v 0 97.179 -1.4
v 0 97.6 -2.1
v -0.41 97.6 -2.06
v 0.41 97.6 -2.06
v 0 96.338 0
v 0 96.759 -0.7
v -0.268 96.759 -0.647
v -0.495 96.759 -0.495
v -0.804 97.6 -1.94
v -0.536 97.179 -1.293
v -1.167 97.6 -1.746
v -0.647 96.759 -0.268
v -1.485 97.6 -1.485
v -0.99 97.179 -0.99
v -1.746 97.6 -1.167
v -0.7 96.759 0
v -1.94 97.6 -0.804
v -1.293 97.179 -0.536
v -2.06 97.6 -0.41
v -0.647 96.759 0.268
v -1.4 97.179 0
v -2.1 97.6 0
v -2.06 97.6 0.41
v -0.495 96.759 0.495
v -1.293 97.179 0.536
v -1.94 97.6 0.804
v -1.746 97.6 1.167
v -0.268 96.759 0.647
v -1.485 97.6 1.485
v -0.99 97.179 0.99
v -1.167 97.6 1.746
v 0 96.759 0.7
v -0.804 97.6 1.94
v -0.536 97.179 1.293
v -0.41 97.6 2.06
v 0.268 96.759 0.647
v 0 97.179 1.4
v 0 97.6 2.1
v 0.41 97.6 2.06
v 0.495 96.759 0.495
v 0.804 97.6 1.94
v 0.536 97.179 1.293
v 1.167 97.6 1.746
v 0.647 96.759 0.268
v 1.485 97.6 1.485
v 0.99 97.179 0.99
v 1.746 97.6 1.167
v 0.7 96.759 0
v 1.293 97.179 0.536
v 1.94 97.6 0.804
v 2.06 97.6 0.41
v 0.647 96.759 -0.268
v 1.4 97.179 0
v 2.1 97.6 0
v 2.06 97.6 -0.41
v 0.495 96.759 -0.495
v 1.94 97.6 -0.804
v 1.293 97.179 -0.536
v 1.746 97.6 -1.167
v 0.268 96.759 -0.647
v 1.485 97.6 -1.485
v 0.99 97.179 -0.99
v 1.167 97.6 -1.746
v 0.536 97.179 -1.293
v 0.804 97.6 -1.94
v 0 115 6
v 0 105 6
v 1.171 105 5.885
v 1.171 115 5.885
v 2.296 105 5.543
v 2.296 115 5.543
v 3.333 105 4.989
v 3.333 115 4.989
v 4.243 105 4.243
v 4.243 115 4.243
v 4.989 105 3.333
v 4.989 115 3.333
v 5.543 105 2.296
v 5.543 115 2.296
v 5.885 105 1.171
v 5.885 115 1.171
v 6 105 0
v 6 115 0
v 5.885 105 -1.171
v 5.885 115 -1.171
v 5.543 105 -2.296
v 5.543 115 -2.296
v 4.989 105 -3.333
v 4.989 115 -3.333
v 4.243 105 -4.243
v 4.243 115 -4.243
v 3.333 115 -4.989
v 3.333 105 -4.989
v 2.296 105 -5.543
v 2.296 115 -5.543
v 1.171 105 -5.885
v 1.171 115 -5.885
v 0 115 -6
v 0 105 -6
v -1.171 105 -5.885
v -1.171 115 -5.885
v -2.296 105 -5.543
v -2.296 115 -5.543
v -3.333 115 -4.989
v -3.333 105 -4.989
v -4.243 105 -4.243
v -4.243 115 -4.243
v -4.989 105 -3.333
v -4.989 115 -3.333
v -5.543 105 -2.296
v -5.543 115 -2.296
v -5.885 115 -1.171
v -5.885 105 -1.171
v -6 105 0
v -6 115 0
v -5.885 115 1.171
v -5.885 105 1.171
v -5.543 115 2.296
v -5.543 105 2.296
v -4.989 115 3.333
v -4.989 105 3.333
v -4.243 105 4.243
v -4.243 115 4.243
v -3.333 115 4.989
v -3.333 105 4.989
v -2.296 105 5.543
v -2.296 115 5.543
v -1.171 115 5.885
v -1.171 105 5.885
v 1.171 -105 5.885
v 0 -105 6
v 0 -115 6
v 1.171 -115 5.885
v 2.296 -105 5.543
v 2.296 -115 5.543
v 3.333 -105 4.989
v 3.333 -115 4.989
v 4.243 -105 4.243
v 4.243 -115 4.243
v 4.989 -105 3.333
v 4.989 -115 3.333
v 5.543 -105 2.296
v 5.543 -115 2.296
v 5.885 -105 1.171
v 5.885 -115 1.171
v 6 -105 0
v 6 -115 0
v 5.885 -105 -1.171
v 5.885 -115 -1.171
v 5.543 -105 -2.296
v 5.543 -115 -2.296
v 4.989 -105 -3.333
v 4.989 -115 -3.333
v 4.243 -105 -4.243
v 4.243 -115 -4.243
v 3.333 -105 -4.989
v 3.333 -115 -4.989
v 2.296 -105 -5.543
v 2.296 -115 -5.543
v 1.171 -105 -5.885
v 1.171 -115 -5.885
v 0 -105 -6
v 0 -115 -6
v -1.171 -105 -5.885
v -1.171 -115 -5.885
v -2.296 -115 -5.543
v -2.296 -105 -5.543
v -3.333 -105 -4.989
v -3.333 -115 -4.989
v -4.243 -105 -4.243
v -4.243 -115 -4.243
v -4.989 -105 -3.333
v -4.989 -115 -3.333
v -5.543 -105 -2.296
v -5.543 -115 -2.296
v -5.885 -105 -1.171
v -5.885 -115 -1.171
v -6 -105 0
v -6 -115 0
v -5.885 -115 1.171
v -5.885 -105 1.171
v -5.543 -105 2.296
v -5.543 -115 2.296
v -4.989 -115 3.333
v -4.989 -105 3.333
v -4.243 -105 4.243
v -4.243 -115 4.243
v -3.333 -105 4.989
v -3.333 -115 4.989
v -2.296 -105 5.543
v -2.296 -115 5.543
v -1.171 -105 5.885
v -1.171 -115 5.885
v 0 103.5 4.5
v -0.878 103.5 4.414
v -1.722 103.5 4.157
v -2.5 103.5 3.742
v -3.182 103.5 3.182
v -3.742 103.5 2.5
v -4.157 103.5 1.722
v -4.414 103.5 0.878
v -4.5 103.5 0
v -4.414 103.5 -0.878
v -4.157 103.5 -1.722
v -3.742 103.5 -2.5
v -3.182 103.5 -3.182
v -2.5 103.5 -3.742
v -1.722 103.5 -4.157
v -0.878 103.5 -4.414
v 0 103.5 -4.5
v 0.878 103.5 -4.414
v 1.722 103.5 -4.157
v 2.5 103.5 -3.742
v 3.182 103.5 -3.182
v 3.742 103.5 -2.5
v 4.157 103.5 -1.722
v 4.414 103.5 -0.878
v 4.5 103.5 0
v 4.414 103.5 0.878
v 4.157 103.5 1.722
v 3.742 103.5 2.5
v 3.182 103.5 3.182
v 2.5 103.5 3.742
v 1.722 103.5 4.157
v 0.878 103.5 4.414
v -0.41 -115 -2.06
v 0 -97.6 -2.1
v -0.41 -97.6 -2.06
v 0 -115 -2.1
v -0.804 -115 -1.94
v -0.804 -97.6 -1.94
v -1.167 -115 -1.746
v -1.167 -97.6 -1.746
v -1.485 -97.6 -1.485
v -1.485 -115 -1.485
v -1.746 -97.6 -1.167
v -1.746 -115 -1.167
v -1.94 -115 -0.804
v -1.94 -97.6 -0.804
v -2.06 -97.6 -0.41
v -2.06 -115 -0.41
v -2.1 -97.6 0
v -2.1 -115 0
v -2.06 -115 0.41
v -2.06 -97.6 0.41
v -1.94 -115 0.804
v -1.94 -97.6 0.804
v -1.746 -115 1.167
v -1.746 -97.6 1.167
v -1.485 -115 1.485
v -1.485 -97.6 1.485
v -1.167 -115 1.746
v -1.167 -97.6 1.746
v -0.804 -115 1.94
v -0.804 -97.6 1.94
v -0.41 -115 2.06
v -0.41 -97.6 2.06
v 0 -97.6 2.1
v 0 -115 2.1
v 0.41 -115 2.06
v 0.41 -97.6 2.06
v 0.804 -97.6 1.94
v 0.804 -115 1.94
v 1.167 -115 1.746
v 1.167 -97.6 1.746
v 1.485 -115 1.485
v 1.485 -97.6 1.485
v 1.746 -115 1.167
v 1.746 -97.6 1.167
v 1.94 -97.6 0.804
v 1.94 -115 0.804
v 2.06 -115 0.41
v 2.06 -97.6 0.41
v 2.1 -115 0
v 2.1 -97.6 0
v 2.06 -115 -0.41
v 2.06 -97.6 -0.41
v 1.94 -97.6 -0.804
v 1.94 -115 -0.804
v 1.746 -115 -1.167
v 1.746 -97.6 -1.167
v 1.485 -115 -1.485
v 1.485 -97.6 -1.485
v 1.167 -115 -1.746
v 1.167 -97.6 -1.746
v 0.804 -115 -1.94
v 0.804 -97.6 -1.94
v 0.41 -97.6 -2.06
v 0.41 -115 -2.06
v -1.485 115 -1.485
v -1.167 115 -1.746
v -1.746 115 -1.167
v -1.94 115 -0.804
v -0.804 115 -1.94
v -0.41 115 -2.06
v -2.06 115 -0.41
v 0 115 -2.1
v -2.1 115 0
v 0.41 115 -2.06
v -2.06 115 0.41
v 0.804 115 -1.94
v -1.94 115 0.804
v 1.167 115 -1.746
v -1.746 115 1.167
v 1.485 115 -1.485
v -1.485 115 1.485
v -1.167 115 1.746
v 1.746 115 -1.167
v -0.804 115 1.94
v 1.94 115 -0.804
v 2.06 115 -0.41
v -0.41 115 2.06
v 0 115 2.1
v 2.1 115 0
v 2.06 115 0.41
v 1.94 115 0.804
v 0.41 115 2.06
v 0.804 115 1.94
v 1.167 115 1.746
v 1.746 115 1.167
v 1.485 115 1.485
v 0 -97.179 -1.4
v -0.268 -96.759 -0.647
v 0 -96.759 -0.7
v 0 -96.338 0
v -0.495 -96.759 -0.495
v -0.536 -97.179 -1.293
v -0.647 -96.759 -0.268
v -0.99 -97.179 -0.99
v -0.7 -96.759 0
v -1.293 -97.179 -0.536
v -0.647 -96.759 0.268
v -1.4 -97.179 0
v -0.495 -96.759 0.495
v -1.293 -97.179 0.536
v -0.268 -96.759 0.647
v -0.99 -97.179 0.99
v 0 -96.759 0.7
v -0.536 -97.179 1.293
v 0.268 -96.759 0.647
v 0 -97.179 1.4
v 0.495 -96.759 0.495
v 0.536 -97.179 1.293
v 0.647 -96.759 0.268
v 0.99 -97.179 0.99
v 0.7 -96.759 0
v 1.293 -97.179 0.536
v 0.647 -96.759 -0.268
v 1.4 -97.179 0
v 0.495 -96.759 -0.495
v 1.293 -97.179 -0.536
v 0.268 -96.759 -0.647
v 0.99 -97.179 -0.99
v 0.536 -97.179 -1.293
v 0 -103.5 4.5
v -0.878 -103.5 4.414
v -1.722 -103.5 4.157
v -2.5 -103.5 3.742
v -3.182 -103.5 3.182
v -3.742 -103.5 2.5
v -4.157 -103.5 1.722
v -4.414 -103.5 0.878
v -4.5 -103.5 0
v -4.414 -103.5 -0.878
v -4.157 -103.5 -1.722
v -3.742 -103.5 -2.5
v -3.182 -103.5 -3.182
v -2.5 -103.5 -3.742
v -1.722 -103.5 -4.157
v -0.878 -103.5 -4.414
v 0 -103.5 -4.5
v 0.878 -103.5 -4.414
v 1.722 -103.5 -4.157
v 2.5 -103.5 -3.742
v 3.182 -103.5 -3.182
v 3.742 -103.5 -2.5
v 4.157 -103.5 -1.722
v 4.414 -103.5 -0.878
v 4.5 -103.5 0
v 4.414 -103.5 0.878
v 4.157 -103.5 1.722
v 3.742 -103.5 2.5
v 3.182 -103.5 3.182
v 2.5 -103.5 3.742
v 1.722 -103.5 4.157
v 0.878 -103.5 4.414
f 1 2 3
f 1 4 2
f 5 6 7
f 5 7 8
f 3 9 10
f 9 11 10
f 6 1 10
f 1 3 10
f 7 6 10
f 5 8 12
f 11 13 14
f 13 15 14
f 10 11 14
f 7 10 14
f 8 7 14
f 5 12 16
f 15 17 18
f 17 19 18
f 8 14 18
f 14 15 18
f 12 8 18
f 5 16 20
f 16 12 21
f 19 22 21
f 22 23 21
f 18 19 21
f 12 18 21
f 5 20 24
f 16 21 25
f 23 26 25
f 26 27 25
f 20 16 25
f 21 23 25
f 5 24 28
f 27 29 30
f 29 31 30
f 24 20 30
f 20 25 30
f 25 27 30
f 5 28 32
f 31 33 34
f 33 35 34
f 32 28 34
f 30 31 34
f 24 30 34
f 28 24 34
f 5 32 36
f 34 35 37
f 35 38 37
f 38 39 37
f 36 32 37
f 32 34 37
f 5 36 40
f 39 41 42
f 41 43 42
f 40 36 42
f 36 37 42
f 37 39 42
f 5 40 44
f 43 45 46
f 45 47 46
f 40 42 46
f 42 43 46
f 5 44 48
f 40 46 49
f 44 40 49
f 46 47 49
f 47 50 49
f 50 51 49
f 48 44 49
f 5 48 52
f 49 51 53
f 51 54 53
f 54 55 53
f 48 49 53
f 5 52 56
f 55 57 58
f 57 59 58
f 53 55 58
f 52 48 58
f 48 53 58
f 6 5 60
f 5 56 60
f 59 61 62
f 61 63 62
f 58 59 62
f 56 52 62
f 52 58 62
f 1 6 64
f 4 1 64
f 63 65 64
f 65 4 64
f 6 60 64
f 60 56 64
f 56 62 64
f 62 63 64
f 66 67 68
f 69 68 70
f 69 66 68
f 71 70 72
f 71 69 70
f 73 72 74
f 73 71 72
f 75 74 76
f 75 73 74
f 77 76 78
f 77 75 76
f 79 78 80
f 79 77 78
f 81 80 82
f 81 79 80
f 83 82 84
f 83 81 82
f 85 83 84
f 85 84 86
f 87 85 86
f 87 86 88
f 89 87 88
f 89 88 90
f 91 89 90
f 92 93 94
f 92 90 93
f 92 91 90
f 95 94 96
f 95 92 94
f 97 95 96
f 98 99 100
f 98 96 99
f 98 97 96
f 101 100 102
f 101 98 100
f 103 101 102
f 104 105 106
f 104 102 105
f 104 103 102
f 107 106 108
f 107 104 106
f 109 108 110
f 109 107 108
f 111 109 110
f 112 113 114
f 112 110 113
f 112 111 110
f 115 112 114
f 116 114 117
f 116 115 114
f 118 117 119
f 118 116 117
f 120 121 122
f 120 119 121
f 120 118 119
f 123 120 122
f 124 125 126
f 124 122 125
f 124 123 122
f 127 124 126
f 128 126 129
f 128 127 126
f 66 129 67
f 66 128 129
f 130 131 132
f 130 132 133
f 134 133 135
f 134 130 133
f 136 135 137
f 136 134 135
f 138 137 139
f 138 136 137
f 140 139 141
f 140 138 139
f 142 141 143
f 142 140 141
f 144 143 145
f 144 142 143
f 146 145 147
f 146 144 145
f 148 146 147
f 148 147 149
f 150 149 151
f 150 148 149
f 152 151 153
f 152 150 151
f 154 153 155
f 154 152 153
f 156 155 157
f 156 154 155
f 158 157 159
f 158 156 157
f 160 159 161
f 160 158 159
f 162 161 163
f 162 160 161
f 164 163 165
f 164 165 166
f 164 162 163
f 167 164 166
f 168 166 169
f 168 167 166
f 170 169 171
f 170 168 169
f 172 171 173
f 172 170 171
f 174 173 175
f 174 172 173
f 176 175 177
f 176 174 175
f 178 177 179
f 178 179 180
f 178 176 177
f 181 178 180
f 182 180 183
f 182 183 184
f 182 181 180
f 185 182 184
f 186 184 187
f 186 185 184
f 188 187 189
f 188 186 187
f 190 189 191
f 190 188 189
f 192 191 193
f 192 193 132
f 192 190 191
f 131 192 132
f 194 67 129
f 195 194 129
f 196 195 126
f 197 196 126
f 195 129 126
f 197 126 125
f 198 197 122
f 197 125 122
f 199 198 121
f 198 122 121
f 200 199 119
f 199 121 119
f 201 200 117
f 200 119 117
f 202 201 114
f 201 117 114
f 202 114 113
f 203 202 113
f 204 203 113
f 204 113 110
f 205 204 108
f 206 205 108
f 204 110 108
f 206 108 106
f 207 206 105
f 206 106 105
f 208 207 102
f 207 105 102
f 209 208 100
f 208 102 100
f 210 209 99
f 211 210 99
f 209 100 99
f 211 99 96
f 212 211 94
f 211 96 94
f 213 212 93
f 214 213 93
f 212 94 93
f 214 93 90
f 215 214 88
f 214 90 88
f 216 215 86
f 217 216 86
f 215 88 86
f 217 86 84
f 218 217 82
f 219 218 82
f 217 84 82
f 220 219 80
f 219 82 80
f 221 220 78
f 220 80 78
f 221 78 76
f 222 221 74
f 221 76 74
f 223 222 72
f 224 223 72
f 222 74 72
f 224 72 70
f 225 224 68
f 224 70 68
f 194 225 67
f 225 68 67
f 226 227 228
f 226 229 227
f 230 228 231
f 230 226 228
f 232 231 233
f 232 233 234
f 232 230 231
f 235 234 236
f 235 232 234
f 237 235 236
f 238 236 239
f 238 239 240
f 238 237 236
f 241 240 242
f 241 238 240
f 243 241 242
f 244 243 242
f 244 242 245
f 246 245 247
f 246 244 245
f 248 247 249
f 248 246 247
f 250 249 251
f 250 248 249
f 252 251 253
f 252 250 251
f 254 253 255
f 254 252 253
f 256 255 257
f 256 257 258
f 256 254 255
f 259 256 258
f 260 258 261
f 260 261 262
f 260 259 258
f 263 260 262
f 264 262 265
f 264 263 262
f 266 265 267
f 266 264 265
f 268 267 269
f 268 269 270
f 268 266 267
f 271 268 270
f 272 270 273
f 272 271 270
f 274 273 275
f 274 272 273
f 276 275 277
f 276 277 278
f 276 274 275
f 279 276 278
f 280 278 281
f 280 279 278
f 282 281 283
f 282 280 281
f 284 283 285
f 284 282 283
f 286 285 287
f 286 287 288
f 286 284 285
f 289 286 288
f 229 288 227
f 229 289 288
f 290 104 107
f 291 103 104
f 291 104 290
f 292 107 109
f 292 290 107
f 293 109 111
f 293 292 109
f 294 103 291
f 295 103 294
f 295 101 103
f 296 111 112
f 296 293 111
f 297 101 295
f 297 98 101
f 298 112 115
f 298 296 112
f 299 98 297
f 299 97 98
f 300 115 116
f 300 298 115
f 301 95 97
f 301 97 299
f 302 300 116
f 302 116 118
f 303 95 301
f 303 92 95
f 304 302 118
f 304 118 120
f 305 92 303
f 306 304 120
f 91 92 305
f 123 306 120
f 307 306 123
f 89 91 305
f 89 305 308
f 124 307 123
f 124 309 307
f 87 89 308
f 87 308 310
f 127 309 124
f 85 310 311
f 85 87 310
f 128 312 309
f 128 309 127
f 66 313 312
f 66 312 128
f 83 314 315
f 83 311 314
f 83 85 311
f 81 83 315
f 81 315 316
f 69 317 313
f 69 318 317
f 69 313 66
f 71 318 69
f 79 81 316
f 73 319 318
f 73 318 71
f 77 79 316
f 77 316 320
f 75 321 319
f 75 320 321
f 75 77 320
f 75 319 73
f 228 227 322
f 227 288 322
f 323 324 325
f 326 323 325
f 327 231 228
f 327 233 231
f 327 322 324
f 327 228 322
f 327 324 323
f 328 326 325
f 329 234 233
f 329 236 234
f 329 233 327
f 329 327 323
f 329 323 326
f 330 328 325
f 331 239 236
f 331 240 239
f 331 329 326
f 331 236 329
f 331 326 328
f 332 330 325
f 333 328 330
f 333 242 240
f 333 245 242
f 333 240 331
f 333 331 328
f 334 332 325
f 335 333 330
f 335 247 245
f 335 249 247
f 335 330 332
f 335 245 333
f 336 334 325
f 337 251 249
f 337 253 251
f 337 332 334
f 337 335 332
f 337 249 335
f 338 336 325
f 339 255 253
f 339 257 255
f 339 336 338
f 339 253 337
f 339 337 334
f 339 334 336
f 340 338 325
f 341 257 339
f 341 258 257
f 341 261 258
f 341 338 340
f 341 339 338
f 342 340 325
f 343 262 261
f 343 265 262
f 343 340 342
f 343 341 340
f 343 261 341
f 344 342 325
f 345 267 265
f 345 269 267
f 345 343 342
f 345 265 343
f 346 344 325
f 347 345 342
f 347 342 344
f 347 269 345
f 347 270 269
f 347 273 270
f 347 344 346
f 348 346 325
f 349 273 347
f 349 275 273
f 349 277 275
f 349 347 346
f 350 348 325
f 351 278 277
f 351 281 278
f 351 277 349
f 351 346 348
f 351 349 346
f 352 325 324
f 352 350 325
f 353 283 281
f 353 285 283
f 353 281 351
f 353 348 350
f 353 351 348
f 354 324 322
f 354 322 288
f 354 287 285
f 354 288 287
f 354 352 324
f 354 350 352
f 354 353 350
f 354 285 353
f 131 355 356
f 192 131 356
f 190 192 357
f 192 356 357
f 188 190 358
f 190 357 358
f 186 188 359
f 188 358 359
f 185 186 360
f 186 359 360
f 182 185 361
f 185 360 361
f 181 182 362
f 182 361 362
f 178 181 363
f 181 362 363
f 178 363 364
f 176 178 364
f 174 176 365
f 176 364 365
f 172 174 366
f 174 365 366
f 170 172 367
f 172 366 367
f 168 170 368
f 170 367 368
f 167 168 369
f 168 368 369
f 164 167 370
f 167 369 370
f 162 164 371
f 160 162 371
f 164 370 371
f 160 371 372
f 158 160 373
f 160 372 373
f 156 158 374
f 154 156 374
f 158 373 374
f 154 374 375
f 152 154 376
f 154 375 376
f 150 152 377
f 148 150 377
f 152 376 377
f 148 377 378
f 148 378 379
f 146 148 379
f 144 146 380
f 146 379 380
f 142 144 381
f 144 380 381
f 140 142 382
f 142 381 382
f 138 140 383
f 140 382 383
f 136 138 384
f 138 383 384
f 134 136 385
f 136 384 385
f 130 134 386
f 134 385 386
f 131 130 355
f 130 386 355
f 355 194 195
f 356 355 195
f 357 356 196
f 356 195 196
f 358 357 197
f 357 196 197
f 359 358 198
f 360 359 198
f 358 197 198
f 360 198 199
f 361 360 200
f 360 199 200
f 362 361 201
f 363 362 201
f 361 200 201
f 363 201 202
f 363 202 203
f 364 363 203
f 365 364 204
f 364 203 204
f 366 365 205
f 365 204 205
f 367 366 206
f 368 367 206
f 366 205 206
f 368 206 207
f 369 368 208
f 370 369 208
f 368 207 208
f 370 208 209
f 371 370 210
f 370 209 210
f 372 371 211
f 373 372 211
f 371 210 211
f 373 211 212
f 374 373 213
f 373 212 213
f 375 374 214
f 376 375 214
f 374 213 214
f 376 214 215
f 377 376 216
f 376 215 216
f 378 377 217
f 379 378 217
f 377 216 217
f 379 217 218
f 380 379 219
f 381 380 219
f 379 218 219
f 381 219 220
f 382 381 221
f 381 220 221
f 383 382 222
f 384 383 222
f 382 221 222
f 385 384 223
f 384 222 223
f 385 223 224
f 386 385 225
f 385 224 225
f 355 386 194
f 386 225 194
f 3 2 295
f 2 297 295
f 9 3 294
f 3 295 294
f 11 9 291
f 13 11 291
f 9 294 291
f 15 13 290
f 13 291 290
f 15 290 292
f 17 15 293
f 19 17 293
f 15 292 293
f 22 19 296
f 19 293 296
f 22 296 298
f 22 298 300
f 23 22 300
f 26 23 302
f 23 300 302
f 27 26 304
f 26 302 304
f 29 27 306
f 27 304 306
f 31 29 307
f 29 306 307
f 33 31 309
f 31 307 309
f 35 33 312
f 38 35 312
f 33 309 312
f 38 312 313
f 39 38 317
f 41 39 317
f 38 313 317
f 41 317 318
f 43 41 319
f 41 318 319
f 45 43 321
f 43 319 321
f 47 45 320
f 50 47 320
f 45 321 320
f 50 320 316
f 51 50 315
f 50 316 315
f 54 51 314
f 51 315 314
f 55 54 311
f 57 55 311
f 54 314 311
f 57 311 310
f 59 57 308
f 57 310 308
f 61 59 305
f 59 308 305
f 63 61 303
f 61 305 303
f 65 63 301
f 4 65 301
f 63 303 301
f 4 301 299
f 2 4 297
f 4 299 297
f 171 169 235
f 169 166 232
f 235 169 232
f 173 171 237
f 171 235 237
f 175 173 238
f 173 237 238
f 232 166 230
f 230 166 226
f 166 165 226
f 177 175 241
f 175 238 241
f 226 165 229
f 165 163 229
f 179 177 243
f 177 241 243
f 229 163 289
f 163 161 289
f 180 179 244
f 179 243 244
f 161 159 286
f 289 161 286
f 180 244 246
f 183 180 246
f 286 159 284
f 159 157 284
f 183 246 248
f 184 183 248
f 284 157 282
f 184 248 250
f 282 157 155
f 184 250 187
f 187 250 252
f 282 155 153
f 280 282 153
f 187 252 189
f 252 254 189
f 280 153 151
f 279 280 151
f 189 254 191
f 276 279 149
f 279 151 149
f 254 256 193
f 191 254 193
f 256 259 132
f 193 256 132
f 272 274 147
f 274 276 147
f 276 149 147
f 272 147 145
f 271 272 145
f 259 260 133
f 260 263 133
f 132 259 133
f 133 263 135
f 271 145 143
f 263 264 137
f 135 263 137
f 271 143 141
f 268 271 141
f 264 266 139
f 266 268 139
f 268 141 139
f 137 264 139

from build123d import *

# Parameters (mm, degrees)
SKETCH_1_R      = 6
EXTRUDE_1_DEPTH = 115
SKETCH_2_W      = 1.5
SKETCH_2_H      = 210
CHAMFER_1_SIZE  = 1.5


with BuildPart() as part:
    # 草图1 → 凸台-拉伸1 (new, symmetric)
    with BuildSketch(Plane(origin=(0, 0, 0), x_dir=(1, 0, 0), z_dir=(0, 1, 0))):
        with Locations(Location((0, 0, 0), (0, 0, 270))):
            Circle(SKETCH_1_R)
    extrude(amount=EXTRUDE_1_DEPTH, both=True)

    # 草图2 → 切除-旋转1 (revolve, cut)
    with BuildSketch(Plane.XY, mode=Mode.PRIVATE) as cut_revolve_1_sk:
        with Locations((5.25, 0)):
            Rectangle(SKETCH_2_W, SKETCH_2_H)
    revolve(cut_revolve_1_sk.sketch.rotate(Axis((0, 115, 0), (0, -1, 0)), 90), axis=Axis((0, 115, 0), (0, -1, 0)), mode=Mode.SUBTRACT)

    # 倒角1
    chamfer_1_edges = [part.edges().sort_by_distance(p)[0] for p in [
        (0, 105, -4.5),
        (0, -105, -4.5),
    ]]
    chamfer(chamfer_1_edges, length=CHAMFER_1_SIZE - 0.0001)  # a hair under: the kernel refuses the full size

    # 草图3 → M5 螺纹孔1 (revolve, cut)
    with BuildSketch(Plane(origin=(0, -115, 0), x_dir=(0, 0, -1), z_dir=(1, 0, 0))):
        Polygon((0, 0), (0, 18.6618073), (2.1, 17.4), (2.1, 0), align=None)
    hole_wizard_m5_1 = revolve(axis=Axis((0, -121.35, 0), (0, 1, 0)), mode=Mode.SUBTRACT)

    # 镜向1: M5 螺纹孔1 across plane
    add(hole_wizard_m5_1.mirror(Plane.ZX), mode=Mode.SUBTRACT)


solid = part.part
